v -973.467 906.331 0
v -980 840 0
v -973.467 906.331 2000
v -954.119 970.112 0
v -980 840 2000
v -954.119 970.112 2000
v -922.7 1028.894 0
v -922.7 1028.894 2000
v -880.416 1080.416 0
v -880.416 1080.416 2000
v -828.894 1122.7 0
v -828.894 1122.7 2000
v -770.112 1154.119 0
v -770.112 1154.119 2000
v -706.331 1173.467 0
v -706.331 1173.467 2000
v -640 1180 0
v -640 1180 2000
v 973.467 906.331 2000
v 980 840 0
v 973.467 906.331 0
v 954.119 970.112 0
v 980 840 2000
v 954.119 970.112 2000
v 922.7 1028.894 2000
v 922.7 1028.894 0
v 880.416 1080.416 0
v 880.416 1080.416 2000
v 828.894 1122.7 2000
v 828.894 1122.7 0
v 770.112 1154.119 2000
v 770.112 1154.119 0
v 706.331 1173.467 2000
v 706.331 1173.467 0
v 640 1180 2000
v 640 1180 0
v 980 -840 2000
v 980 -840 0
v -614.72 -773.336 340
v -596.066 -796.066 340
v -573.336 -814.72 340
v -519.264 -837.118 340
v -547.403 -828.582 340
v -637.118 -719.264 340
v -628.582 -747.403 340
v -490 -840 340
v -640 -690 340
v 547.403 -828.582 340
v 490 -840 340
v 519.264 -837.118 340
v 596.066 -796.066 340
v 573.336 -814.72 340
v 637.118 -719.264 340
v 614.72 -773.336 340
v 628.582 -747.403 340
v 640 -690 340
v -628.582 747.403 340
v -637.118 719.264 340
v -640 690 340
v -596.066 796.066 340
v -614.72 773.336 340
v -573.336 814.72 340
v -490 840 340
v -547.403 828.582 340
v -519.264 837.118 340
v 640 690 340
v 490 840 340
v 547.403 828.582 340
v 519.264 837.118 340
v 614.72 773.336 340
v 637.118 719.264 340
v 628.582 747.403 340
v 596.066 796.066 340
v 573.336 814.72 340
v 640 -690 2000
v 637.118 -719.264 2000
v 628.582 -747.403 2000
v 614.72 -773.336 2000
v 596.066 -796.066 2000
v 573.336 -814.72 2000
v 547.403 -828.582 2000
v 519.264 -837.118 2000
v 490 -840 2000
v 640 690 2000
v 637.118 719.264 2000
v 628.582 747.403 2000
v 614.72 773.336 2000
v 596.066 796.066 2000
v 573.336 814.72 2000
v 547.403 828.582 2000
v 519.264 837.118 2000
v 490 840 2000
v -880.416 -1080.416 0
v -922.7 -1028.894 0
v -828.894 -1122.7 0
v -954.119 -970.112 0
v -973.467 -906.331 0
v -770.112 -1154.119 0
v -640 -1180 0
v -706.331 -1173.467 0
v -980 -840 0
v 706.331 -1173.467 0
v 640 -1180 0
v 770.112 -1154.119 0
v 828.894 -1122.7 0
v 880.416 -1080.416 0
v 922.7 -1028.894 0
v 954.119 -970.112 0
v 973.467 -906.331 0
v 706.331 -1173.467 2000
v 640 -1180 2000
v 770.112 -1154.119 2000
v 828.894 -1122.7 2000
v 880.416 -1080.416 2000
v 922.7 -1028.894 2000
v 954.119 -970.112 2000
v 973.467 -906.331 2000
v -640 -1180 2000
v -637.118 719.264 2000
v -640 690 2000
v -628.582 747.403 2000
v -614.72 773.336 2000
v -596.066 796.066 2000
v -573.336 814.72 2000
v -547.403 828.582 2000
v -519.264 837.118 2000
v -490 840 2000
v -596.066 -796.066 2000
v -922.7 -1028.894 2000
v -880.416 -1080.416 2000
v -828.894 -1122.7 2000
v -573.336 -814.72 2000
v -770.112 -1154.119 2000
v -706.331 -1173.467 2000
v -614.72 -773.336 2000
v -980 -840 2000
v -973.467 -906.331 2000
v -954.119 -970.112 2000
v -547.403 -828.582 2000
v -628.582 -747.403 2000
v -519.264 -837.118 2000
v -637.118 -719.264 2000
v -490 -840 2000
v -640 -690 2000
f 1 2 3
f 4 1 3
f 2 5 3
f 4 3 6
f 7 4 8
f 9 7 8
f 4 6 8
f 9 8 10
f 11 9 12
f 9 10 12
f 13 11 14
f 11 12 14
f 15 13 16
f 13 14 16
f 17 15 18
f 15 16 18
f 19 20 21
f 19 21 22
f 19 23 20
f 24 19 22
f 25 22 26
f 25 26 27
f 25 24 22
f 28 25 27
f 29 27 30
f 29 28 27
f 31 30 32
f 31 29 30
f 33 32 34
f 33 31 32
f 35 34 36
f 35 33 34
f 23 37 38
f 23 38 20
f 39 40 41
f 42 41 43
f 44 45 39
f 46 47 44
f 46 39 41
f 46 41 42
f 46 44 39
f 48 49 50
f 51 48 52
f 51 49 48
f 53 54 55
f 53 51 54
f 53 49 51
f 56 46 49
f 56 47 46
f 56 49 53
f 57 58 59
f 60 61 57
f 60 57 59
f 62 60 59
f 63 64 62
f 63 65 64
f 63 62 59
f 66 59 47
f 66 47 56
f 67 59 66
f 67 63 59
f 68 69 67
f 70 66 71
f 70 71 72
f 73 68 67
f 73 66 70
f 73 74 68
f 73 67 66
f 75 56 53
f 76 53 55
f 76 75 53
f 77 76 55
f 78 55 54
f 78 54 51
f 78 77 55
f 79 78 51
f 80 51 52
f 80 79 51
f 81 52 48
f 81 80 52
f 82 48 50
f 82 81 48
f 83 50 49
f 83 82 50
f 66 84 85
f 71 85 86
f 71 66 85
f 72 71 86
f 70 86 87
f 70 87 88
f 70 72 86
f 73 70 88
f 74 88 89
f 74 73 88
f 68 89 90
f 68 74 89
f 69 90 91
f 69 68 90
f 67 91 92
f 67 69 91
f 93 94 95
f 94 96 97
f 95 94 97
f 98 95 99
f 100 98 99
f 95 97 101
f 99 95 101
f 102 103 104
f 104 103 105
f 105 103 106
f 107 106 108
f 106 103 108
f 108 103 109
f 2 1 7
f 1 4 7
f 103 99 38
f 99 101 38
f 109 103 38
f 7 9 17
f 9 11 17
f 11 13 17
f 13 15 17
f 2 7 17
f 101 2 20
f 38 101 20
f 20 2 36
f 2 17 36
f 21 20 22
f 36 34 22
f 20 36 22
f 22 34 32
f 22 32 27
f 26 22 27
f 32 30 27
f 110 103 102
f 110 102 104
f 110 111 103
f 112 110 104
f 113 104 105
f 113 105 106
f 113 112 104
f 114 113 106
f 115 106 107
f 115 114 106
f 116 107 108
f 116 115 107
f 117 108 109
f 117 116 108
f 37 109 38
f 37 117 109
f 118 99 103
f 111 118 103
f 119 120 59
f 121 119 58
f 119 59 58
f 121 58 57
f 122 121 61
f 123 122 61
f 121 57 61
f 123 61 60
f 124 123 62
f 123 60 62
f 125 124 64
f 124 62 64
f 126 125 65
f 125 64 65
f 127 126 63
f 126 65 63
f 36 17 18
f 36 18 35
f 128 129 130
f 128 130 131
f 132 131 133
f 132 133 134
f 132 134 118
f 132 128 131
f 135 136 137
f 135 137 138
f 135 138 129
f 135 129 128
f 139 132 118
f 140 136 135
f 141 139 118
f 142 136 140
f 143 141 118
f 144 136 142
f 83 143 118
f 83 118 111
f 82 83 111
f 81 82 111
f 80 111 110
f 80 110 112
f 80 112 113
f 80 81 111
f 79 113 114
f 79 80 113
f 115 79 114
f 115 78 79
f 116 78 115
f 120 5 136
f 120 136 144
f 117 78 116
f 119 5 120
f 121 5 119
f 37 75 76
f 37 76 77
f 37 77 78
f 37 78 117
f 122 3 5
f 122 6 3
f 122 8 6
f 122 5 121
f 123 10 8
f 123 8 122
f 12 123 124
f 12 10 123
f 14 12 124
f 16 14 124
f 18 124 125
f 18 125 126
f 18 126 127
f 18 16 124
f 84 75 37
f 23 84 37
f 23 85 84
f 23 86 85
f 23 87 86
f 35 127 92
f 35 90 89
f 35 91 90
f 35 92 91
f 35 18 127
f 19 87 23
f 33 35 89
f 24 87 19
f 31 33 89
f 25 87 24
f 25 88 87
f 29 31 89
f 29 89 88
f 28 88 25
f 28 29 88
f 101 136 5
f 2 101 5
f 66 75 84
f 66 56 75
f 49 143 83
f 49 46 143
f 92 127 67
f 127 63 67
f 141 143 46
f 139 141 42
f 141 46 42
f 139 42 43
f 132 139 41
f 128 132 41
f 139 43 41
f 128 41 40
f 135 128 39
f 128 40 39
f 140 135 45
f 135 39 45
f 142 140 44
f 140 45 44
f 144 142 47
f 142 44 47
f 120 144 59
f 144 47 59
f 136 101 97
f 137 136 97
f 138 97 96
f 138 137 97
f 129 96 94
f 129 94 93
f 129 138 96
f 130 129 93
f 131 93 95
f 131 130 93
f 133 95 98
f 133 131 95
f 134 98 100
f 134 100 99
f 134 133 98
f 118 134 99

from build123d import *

# Parameters (mm, degrees)
F0_W     = 1960
F0_H     = 2360
F1_DEPTH = 2000
F2_T     = -340
F3_R     = 340
F4_R     = 150


with BuildPart() as f1:
    # F0 (on Top) → F1 (new body)
    with BuildSketch(Plane.XY):
        Rectangle(F0_W, F0_H)
    extrude(amount=F1_DEPTH)

    # F2
    f2_openings = [f1.faces().sort_by_distance(p)[0] for p in [
        (0, 0, 2000),
    ]]
    offset(amount=F2_T, openings=f2_openings)

    # F3
    f3_edges = [f1.edges().sort_by_distance(p)[0] for p in [
        (-980, 1180, 1000),
        (980, 1180, 1000),
        (-980, -1180, 1000),
        (980, -1180, 1000),
    ]]
    fillet(f3_edges, radius=F3_R)

    # F4
    f4_edges = [f1.edges().sort_by_distance(p)[0] for p in [
        (640, 840, 1170),
        (640, -840, 1170),
        (-640, -840, 1170),
        (-640, 840, 1170),
    ]]
    fillet(f4_edges, radius=F4_R)


solid = f1.part
